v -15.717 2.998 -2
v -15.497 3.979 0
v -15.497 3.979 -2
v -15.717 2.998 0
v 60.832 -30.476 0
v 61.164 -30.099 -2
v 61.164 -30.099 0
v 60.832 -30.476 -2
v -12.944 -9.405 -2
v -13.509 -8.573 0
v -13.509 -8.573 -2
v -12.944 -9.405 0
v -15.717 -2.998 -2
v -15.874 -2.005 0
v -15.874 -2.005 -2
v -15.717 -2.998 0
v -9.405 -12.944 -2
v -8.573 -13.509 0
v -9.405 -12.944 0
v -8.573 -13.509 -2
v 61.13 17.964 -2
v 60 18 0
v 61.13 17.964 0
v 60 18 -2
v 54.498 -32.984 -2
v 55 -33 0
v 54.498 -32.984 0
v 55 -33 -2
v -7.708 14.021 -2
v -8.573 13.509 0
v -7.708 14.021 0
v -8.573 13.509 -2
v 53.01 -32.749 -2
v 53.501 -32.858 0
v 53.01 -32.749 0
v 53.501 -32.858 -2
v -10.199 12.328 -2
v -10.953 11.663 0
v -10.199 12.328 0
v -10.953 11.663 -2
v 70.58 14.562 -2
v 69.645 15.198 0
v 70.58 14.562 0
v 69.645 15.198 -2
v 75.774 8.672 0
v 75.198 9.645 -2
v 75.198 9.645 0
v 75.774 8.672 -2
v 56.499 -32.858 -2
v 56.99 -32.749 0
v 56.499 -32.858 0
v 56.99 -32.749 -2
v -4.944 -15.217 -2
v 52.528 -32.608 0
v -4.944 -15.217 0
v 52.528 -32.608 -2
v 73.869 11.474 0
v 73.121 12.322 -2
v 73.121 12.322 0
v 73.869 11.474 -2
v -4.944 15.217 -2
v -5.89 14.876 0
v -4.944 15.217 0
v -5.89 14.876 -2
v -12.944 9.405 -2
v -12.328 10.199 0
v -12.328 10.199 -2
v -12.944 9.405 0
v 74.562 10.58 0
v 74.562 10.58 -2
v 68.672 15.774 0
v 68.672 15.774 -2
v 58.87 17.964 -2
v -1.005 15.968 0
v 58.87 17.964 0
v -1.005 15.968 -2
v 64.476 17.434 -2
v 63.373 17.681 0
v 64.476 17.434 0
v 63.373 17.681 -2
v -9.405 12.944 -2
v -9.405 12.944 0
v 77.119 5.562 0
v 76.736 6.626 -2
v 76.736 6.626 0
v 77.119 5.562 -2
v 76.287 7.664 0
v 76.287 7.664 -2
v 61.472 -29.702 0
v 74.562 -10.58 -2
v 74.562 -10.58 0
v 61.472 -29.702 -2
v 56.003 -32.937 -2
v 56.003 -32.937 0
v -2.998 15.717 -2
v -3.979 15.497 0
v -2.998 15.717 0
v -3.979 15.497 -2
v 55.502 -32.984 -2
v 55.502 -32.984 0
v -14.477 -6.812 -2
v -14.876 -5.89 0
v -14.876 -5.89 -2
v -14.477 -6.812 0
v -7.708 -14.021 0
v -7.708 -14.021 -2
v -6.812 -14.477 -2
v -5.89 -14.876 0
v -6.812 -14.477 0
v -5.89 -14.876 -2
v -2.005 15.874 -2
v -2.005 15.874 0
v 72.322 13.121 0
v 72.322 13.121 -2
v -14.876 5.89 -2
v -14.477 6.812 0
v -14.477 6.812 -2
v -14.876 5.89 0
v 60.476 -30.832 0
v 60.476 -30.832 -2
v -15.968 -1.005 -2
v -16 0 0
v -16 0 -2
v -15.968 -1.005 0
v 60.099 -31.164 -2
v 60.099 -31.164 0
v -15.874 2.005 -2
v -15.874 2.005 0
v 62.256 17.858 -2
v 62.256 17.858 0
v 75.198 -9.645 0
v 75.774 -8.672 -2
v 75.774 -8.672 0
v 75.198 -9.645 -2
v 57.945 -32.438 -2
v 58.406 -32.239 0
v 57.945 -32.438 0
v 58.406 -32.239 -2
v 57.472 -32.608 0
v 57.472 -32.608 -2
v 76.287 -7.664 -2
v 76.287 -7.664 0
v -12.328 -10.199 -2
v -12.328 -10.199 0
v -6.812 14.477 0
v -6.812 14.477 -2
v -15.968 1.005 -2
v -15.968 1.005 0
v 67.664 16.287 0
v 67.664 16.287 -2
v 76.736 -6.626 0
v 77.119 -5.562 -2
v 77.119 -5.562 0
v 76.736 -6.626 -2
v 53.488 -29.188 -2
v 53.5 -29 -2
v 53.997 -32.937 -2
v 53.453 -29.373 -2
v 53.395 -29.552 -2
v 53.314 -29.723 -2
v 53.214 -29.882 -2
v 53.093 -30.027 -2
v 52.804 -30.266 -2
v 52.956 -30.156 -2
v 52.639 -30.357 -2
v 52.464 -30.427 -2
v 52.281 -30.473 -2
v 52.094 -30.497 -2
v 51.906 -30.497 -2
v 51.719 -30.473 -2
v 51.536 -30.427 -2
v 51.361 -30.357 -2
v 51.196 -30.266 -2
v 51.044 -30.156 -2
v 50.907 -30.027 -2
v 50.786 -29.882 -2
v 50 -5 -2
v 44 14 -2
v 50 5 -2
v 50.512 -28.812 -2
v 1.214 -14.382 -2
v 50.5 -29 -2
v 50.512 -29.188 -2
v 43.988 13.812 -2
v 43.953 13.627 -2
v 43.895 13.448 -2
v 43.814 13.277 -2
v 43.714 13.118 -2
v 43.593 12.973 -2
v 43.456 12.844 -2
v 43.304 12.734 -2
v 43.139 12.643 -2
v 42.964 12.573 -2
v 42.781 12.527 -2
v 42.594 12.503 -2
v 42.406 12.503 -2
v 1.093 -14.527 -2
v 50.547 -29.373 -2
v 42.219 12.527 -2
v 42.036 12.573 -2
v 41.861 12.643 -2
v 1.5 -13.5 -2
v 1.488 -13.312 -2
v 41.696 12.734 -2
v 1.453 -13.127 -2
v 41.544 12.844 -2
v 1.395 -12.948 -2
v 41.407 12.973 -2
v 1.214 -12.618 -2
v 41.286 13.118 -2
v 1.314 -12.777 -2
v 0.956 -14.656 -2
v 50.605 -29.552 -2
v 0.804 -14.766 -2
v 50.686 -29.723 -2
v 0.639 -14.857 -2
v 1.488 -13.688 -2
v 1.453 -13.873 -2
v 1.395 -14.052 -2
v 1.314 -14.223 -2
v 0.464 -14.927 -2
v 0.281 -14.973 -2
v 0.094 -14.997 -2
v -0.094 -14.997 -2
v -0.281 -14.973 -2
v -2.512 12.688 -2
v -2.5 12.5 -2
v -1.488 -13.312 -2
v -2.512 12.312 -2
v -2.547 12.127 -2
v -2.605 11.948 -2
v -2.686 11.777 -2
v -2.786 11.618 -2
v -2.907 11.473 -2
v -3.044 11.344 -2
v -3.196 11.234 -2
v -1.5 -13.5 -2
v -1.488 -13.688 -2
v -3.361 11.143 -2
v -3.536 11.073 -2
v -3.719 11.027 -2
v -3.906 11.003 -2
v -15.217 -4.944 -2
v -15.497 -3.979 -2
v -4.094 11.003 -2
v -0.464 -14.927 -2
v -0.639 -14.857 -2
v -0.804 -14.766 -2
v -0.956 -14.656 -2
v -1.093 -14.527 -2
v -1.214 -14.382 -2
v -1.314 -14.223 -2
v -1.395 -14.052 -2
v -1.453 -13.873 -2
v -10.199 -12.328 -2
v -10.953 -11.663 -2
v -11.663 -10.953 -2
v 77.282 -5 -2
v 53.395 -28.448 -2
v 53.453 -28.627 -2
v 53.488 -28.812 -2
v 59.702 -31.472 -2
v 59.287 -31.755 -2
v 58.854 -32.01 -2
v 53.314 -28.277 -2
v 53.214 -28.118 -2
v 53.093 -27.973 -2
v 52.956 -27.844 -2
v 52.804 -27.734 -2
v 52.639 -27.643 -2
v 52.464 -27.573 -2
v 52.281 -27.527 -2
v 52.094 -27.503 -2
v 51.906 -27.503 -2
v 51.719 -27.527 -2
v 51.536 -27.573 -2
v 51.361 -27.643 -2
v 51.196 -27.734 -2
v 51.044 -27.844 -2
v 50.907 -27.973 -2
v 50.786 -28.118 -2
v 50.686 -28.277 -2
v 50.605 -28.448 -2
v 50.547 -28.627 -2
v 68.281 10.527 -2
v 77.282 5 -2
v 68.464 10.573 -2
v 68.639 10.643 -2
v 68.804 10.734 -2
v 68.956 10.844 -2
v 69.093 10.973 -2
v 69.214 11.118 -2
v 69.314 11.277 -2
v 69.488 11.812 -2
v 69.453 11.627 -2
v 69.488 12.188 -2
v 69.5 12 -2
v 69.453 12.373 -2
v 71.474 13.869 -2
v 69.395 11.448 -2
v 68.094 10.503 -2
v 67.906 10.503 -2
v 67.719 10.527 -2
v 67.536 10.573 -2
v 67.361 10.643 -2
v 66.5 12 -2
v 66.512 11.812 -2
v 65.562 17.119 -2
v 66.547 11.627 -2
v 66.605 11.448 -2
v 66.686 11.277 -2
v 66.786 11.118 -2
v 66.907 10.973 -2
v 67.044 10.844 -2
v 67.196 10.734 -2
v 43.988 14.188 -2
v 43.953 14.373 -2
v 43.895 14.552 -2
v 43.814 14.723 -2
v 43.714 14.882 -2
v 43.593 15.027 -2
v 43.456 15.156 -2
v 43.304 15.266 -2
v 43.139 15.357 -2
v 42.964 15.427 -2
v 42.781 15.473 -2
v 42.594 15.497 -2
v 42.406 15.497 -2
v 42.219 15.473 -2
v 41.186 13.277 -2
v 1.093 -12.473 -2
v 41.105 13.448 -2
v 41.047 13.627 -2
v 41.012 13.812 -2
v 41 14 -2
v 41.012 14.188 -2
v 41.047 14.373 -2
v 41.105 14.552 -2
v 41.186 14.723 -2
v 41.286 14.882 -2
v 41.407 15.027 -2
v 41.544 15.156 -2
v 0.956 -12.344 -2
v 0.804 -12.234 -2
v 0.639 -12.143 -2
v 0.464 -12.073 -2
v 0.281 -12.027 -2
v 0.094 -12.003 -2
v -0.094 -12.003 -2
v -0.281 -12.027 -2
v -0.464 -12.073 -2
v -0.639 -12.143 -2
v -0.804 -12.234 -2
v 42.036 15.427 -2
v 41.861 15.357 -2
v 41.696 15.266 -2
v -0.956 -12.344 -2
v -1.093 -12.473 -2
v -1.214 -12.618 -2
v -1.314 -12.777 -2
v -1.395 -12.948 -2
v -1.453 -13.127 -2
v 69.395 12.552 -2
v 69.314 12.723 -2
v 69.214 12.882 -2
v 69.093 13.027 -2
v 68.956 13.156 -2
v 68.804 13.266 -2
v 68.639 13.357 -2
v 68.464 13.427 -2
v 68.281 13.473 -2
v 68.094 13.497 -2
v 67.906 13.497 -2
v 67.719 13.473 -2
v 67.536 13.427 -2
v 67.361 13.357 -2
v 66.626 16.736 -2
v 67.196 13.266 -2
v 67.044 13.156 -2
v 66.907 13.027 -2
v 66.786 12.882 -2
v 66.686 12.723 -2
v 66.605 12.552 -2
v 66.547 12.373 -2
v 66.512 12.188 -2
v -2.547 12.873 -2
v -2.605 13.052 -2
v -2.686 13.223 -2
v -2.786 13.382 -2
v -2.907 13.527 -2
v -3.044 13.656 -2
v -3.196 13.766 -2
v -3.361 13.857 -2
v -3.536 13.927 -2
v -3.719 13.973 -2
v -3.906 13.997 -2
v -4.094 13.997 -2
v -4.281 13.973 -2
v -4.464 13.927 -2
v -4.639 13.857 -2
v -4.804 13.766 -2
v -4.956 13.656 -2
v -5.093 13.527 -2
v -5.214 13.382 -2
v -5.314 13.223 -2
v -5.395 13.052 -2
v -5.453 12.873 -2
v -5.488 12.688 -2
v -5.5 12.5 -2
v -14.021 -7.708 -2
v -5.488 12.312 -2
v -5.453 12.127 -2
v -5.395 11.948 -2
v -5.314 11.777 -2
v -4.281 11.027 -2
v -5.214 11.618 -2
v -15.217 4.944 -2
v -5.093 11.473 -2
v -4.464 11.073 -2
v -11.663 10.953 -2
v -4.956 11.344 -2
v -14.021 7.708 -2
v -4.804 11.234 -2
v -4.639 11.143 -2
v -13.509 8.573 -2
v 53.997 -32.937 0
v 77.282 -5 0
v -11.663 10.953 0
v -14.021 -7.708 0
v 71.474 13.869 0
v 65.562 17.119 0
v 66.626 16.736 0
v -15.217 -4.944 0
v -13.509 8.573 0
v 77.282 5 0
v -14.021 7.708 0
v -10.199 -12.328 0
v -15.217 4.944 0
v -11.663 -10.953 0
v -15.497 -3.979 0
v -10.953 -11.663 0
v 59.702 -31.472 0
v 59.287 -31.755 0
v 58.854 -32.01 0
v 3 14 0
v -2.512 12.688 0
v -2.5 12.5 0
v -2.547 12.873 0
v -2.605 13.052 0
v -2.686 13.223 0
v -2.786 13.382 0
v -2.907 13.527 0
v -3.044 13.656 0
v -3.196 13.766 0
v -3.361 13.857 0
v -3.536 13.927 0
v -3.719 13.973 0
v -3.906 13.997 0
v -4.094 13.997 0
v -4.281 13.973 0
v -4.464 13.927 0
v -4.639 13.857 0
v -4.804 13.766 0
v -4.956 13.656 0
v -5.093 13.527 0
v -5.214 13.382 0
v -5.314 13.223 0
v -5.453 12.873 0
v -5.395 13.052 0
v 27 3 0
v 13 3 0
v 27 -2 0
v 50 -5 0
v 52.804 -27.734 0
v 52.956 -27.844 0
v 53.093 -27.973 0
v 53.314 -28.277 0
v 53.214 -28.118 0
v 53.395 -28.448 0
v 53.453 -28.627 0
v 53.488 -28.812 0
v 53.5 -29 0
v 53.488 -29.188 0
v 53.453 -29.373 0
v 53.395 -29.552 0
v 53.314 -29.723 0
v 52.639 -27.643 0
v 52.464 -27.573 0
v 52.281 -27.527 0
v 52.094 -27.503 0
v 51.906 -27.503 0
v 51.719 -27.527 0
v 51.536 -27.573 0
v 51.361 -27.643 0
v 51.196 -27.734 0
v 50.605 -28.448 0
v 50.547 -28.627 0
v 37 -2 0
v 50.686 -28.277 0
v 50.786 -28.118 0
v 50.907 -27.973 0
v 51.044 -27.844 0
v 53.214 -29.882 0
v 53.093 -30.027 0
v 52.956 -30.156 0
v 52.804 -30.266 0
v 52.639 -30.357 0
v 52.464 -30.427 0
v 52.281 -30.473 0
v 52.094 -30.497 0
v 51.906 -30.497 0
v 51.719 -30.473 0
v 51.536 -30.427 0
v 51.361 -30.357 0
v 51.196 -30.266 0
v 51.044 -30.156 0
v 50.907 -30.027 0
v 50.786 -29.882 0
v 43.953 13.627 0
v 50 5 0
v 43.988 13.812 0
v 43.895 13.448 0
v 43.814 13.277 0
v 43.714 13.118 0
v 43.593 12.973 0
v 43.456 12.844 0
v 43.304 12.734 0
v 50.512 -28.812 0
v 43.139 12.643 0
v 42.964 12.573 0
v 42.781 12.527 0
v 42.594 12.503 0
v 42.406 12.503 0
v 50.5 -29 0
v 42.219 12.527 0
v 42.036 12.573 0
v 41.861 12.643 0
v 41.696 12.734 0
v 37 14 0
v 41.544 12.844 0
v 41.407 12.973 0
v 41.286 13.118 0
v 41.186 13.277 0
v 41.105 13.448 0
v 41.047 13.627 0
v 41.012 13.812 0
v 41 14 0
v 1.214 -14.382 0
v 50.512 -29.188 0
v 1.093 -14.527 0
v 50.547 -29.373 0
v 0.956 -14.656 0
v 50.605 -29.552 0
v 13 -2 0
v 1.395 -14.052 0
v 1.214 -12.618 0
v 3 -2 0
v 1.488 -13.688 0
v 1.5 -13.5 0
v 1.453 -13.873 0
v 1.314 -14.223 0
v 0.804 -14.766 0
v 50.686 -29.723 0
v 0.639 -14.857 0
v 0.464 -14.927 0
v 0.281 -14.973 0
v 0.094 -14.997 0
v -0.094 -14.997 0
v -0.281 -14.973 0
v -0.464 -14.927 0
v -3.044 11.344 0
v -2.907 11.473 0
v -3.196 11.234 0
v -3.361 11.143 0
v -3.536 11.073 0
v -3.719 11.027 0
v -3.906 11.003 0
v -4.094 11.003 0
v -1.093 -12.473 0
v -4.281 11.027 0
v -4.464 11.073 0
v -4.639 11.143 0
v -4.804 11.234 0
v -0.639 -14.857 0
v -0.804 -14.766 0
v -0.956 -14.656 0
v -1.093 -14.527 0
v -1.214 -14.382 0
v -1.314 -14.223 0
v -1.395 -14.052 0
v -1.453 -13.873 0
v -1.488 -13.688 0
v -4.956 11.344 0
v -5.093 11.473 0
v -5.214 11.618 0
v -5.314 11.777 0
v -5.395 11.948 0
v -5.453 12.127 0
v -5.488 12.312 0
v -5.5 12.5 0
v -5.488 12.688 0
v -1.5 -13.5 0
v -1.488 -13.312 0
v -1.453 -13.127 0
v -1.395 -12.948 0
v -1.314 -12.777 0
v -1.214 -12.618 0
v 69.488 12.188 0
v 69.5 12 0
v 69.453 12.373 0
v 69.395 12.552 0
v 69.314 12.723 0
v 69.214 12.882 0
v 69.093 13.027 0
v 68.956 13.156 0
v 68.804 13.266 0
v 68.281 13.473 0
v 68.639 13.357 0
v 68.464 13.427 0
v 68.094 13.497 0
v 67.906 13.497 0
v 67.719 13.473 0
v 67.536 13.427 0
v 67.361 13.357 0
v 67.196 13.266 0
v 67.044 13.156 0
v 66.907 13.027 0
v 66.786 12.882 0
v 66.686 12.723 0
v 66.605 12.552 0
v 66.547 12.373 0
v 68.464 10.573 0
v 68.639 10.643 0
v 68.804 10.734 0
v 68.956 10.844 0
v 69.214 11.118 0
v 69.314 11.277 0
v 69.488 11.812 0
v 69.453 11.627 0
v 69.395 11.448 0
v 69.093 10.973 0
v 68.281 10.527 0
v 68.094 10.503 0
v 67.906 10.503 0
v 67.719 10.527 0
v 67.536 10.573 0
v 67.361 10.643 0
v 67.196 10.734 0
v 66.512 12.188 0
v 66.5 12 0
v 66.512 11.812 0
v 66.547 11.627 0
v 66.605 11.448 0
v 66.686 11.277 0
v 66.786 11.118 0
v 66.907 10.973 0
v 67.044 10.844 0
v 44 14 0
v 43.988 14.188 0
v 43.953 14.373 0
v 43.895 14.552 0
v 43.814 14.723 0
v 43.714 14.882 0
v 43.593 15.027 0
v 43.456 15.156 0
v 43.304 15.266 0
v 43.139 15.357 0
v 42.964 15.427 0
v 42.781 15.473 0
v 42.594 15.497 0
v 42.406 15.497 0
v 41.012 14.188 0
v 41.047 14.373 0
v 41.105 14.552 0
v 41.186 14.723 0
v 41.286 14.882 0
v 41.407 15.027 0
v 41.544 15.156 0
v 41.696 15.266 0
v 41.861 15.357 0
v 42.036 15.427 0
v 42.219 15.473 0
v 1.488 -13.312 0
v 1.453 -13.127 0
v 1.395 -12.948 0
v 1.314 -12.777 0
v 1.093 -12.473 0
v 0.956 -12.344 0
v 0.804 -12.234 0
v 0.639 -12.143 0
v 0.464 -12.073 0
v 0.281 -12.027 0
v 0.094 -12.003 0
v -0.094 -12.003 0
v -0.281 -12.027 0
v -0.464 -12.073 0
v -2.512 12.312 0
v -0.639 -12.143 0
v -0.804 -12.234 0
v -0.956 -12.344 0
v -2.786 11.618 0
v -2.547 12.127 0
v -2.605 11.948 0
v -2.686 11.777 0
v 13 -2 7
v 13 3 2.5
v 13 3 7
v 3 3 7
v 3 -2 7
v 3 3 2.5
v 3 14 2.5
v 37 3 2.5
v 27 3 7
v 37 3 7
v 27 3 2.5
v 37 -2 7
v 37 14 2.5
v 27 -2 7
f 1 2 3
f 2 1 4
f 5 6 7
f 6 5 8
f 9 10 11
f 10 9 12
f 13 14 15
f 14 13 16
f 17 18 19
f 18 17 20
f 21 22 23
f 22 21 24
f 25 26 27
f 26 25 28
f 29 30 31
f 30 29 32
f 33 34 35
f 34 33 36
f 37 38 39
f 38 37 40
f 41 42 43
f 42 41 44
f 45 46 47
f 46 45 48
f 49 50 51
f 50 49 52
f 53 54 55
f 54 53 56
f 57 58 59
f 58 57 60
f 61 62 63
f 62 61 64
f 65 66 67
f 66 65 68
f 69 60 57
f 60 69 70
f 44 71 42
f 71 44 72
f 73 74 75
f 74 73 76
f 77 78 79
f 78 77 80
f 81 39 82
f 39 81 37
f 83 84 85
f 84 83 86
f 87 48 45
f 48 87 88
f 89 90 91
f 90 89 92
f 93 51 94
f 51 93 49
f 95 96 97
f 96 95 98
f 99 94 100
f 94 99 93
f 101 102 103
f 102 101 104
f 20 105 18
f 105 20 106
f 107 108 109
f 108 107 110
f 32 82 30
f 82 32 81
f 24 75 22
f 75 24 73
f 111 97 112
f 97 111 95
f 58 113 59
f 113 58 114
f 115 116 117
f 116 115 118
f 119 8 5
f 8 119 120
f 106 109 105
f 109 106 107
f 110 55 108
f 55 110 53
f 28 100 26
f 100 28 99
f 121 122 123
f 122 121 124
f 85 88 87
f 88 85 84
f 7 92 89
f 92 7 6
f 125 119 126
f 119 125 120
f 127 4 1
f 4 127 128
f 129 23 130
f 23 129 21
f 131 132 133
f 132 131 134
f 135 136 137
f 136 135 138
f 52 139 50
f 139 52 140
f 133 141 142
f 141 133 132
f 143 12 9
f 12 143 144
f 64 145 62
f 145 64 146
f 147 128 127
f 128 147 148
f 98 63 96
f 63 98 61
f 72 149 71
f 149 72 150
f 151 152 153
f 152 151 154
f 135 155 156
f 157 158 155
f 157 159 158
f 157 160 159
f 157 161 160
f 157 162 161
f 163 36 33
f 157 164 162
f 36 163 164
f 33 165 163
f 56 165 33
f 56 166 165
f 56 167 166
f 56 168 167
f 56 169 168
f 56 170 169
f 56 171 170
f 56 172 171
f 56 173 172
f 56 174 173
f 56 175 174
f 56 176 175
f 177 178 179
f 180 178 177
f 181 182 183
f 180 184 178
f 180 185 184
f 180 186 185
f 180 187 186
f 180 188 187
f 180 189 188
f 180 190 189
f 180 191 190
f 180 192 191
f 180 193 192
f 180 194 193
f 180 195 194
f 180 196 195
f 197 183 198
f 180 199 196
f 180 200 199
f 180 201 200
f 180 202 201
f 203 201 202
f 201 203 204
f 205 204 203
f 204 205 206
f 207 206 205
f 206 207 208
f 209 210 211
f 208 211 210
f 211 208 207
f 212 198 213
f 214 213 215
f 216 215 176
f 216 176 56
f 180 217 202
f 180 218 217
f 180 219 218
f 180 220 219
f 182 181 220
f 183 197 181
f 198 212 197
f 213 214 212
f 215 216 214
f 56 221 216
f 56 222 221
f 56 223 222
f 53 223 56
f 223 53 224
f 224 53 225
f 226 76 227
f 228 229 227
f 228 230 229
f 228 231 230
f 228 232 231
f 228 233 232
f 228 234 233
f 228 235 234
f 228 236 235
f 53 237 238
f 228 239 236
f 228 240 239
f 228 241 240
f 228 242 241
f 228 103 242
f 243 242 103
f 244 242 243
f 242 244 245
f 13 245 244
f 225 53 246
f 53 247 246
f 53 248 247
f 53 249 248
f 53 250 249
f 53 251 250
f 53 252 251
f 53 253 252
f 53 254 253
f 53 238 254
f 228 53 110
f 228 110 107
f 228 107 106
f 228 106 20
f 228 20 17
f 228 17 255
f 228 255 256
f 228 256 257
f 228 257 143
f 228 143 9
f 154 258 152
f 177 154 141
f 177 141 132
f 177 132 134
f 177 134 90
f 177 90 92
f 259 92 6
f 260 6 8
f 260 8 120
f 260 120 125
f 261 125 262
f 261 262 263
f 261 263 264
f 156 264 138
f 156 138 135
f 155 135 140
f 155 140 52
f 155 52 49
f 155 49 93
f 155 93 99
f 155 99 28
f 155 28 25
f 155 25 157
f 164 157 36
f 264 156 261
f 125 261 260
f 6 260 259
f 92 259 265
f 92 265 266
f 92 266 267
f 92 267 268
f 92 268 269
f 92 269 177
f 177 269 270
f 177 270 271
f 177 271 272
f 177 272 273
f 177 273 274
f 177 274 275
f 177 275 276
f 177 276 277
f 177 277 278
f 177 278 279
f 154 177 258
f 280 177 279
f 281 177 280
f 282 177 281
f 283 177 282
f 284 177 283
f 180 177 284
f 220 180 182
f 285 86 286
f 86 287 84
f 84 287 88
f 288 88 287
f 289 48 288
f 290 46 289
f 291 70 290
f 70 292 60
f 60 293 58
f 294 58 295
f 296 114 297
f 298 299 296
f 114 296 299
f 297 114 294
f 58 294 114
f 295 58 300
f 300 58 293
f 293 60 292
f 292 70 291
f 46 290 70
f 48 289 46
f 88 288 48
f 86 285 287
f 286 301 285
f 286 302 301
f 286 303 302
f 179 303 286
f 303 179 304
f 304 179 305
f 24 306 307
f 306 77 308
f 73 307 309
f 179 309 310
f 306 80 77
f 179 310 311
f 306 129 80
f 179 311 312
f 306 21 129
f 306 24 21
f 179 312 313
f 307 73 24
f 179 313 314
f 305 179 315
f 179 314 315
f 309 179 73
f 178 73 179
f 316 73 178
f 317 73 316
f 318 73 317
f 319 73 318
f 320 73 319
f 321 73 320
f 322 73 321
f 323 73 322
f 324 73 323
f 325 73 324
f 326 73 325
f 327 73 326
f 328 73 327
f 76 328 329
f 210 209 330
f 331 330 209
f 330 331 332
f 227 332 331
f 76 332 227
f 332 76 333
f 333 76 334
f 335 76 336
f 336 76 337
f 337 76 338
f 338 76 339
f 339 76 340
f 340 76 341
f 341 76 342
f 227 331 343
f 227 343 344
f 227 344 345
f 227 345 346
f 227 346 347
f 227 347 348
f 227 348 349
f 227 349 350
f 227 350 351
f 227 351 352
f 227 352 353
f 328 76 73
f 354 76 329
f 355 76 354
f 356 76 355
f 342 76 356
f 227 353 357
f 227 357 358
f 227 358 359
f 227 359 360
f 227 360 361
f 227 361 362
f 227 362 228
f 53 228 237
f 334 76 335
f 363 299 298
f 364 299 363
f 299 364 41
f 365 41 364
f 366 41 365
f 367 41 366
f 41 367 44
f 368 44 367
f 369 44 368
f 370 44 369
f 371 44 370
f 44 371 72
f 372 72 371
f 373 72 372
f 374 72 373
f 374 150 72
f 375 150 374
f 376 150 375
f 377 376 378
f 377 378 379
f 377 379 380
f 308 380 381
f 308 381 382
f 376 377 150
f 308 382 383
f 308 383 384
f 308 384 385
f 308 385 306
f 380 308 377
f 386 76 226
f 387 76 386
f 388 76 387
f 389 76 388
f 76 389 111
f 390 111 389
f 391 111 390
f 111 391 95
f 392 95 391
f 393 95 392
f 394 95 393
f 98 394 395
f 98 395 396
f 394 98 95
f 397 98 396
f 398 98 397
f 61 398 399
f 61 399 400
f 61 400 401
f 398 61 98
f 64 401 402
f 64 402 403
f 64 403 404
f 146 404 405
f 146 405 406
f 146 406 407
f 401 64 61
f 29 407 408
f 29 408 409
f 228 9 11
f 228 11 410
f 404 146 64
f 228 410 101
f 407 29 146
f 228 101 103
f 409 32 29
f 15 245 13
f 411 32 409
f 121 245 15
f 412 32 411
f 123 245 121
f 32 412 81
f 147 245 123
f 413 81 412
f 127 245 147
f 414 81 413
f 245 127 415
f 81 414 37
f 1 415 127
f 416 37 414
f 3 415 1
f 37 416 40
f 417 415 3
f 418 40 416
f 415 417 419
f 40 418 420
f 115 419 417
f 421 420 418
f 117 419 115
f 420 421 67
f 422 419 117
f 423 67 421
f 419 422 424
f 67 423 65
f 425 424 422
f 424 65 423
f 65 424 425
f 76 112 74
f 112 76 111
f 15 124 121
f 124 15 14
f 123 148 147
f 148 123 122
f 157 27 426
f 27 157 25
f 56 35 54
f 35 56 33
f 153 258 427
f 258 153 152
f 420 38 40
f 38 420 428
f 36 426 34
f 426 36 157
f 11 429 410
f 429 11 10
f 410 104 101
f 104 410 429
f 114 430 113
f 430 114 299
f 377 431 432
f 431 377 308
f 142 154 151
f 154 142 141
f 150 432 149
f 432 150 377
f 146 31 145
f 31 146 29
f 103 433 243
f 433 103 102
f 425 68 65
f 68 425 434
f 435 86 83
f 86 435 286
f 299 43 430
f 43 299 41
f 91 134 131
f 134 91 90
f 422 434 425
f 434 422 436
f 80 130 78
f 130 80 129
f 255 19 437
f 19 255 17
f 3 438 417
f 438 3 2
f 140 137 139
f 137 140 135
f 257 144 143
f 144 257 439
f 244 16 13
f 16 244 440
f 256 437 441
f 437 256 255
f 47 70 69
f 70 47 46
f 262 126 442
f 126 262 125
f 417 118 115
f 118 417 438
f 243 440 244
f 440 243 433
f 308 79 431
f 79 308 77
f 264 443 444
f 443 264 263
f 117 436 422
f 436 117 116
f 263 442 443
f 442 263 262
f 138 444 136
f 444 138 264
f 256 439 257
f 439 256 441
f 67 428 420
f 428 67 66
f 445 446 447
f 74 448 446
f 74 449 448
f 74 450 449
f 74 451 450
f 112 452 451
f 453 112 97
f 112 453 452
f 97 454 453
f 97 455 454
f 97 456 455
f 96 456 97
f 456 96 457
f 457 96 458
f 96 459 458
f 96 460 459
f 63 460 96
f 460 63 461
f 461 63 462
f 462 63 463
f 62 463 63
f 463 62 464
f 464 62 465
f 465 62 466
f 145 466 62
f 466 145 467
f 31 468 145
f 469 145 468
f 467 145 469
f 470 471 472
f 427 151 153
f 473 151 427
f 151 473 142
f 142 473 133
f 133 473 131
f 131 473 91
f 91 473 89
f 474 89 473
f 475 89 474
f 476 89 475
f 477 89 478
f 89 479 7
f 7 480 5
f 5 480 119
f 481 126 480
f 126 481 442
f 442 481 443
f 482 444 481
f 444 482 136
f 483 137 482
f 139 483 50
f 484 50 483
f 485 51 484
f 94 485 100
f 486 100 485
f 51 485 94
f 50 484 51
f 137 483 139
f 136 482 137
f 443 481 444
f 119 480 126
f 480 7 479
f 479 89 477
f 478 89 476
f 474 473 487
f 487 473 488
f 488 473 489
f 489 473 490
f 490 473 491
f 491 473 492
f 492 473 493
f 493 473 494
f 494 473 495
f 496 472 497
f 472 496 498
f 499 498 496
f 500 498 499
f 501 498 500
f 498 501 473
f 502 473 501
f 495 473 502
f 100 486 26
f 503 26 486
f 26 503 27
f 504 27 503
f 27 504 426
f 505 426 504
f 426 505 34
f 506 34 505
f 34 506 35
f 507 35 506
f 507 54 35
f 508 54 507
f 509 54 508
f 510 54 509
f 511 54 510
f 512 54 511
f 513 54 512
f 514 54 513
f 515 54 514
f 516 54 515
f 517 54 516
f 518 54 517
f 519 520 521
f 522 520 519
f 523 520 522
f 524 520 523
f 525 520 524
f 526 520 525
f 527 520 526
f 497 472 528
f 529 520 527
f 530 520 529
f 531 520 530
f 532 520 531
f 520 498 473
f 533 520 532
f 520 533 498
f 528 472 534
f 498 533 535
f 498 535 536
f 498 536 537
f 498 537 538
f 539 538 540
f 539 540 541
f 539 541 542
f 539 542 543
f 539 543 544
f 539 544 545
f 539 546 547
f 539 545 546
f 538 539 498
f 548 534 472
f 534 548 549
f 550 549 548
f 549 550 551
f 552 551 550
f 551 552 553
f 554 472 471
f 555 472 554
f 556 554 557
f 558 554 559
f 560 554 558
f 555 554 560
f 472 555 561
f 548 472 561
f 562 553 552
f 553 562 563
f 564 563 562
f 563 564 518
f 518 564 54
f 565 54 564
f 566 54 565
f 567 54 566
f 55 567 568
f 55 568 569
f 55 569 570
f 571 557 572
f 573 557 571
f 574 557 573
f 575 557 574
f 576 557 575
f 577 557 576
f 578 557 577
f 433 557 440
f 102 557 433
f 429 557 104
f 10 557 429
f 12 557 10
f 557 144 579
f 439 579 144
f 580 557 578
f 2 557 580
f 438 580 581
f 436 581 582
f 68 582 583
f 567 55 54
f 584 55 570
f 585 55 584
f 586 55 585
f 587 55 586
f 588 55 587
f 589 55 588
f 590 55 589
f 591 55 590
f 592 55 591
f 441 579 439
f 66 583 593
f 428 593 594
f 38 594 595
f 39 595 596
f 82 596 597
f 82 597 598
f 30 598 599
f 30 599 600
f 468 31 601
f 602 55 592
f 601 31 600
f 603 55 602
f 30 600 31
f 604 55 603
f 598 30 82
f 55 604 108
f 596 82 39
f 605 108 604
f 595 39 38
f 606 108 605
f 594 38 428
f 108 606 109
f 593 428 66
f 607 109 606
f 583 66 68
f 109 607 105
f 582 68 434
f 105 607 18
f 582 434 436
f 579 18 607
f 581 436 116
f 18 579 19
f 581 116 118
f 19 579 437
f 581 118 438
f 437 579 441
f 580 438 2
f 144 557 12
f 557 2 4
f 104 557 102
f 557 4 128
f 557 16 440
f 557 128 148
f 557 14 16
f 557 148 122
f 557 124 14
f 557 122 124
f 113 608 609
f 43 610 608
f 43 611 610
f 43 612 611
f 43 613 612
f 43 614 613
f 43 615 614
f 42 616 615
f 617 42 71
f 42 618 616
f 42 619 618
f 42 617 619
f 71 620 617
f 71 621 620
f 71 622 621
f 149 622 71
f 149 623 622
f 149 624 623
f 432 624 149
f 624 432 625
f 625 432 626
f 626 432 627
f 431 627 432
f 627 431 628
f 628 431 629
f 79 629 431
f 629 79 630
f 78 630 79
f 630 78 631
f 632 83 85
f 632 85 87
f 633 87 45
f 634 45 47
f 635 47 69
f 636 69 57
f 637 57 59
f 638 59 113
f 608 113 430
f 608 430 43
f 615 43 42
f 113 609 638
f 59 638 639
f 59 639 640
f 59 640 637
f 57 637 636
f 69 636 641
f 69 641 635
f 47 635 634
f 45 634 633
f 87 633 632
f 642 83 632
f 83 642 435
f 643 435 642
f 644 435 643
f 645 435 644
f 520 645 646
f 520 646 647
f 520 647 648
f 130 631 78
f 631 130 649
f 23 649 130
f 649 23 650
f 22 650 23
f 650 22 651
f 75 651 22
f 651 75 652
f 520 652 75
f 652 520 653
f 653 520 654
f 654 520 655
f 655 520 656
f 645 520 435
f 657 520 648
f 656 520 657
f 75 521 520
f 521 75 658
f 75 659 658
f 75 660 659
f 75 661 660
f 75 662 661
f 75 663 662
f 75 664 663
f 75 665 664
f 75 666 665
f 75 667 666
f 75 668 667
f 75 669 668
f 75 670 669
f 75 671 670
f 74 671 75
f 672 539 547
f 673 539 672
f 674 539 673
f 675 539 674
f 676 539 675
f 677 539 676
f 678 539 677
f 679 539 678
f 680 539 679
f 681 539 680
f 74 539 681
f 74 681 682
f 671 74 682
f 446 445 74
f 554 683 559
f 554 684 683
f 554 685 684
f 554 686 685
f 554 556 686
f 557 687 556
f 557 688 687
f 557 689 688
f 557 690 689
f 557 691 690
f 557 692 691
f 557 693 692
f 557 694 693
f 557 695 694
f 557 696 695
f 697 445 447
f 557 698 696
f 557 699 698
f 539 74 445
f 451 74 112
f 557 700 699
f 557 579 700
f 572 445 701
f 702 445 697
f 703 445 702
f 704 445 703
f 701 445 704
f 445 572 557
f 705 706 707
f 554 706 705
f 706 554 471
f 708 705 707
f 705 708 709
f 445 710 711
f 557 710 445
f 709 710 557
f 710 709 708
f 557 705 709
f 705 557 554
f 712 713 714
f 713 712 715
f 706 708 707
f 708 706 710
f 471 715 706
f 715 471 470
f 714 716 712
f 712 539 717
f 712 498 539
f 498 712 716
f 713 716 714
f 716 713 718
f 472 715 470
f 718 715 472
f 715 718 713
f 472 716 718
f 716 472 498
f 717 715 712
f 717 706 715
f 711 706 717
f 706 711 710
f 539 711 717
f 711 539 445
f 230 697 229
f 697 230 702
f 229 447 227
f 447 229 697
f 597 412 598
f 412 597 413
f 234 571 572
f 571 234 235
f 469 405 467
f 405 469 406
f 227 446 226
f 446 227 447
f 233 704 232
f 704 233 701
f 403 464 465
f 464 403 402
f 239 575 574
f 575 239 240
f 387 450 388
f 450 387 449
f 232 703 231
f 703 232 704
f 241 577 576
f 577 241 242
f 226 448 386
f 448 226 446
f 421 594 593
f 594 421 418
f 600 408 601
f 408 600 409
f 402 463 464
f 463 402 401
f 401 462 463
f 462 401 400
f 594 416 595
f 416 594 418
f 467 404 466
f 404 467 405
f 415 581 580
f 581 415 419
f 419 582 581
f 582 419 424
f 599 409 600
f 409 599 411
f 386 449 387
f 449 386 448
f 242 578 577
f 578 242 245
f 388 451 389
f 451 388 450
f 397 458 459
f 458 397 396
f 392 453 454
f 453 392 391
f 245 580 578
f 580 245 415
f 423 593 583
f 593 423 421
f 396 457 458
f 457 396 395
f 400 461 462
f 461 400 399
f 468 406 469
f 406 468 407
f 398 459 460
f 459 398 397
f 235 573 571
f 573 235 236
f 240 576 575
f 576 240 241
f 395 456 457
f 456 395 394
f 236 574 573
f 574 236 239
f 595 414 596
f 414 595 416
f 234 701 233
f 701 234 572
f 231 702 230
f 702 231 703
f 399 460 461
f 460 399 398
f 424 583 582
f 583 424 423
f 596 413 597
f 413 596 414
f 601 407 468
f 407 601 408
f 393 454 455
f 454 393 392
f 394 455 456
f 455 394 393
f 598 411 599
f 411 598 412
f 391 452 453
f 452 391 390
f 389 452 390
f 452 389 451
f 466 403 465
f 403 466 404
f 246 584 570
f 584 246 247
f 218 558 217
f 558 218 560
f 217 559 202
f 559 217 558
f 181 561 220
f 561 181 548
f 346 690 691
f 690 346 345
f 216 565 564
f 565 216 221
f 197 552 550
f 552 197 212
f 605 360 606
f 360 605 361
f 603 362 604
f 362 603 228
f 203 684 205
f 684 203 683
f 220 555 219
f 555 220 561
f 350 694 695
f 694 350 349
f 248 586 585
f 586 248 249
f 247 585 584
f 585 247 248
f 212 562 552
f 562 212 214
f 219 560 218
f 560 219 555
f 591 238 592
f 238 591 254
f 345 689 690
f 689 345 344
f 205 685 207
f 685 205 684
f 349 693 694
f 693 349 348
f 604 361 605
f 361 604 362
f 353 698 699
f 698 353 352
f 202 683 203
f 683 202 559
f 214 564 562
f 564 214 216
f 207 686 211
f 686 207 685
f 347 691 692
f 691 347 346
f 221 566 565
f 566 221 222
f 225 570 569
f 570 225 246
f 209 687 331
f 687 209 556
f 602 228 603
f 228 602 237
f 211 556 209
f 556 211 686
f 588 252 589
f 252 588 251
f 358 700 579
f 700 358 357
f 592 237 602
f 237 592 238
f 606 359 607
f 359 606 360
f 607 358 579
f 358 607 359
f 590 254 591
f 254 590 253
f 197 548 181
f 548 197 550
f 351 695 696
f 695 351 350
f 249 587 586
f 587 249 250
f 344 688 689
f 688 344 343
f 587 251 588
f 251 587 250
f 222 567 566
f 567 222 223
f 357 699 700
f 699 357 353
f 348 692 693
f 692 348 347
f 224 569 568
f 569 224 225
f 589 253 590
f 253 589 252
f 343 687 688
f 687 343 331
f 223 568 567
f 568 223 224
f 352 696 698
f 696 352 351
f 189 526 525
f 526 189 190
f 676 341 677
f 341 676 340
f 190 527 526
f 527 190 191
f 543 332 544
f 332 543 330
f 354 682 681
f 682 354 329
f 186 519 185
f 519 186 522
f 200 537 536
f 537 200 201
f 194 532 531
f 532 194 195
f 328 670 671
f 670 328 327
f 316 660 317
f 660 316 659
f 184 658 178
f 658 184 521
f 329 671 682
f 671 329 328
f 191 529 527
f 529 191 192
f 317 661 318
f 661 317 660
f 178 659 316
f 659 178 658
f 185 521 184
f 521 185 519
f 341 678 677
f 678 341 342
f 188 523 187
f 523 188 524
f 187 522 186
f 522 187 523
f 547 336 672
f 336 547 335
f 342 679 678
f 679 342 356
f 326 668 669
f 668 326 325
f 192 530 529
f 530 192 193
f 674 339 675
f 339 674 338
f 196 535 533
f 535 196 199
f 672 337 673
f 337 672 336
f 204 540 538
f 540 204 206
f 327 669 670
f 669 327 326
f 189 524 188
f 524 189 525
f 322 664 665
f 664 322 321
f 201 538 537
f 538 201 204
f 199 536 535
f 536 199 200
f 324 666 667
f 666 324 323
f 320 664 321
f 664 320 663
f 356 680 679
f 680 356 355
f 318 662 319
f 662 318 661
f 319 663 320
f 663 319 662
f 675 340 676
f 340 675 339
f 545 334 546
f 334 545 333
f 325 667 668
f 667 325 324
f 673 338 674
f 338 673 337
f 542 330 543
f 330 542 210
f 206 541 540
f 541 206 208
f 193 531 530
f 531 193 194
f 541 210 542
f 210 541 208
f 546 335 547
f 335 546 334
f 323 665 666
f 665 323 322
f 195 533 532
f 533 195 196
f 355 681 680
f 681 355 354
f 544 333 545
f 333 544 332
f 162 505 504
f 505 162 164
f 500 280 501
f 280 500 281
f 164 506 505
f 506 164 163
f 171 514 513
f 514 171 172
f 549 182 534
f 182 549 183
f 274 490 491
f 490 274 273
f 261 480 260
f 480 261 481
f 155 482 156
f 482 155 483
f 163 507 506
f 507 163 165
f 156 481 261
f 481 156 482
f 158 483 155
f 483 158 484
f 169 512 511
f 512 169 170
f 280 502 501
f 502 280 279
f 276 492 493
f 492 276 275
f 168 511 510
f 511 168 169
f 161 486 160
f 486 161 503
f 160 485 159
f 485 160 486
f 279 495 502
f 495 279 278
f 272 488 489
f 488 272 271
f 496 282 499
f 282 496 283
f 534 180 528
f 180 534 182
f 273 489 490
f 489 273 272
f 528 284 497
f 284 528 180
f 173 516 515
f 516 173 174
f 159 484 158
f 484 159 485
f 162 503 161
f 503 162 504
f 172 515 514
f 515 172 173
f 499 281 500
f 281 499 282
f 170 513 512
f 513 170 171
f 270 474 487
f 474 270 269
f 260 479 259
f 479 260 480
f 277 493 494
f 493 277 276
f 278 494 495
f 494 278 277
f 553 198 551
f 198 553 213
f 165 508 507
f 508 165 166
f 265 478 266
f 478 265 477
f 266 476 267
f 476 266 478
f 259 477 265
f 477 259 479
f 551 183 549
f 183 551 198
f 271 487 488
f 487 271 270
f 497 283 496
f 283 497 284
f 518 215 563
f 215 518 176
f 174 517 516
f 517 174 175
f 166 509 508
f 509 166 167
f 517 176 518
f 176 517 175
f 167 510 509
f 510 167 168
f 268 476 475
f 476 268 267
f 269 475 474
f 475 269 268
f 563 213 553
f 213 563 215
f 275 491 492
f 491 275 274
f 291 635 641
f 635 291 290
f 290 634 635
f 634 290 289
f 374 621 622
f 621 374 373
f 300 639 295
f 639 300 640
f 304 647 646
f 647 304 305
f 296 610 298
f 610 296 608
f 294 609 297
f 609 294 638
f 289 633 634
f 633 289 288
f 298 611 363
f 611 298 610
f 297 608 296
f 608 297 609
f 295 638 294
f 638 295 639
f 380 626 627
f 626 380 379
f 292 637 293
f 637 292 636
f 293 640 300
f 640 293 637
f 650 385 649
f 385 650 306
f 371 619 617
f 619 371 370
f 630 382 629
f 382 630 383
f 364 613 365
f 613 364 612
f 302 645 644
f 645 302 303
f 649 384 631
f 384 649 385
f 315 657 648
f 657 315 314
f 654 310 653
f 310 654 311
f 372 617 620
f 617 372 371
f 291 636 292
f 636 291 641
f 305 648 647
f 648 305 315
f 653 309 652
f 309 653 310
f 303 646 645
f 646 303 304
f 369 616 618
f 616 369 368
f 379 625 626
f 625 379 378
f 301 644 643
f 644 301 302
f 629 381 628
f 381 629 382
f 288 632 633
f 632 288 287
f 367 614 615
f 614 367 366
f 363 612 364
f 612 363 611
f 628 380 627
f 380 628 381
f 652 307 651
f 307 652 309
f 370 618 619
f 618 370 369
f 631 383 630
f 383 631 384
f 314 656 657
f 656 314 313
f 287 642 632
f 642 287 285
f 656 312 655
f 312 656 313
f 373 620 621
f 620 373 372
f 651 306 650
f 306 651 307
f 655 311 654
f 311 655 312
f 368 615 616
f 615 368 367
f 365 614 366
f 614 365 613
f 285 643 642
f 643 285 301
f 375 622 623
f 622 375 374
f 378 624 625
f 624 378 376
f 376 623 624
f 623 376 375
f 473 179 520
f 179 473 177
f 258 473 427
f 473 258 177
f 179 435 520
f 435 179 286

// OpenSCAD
r_ext=16;
ep=2;
hauteur=103;
r_vis=1.4;

module boitier(){
	difference(){
		hull(){
			cylinder(h = hauteur, r = r_ext, $fn=100);
			translate([60,0,0]){cylinder(h = hauteur, r = r_ext+2, $fn=100);}
			translate([55,25,0]){cylinder(h = hauteur, r = 8, $fn=100);}
		}

		//évidement intérieur général
		hull(){
			translate([0,0,-2])cylinder(h = hauteur+5, r = r_ext-ep, $fn=100);
			translate([60,0,-2]){cylinder(h = hauteur+5, r = r_ext+2-ep, $fn=100);}
			translate([55,25,-2]){cylinder(h = hauteur+5, r = 6, $fn=100);}
		}
		//ouvertures pour écran
		translate([7,-r_ext-5,12.5]){cube([26,10,78]);}

		//trou pour encodeur
		translate([59,-r_ext-5,63]){rotate([-90,0,0])cylinder(h = 15, r = 6, $fn=50);}
		
		
	}

	//ajout pour vissage des flancs
	difference(){
		union(){
			translate([-4,-r_ext+3.5,0])cylinder(h = hauteur, r = 2.5, $fn=50);
			translate([0,r_ext-2.5,0])cylinder(h = hauteur, r = 2.5, $fn=50);
			translate([42.5,-r_ext+2,0])cylinder(h = hauteur, r = 2.5, $fn=50);
			translate([52,29,0])cylinder(h = hauteur, r = 2.5, $fn=50);
			translate([68,-r_ext+4,0])cylinder(h = hauteur, r = 2.5, $fn=50);
		}

		translate([-4,-r_ext+3.5,-2])cylinder(h = hauteur+10, r = r_vis, $fn=50);
		translate([0,r_ext-2.5,-2])cylinder(h = hauteur+10, r = r_vis, $fn=50);
		translate([42.5,-r_ext+2,-2])cylinder(h = hauteur+10, r = r_vis, $fn=50);
		translate([52,29,-2])cylinder(h = hauteur+10, r = r_vis, $fn=50);
		translate([68,-r_ext+4,-2])cylinder(h = hauteur+10, r = r_vis, $fn=50);
	}
	

}

module capot(){
	difference(){
        union(){
            hull(){
                cylinder(h = ep, r = r_ext, $fn=100);
                translate([60,0,0]){cylinder(h = ep, r = r_ext+2, $fn=100);}
                translate([55,25,0]){cylinder(h = ep, r = 8, $fn=100);}
            }
            //déport pour maintenir l'écran en place
            translate([-r_ext+19,-r_ext+13,-7]){cube([10,5,7]);}
            translate([-r_ext+43,-r_ext+13,-7]){cube([10,5,7]);}
            translate([-r_ext+19,-r_ext+ep,-2.5]){cube([34,11,2.5]);}
            
        }
        //trous de vissage
        translate([-4,-r_ext+3.5,-2])cylinder(h = hauteur+10, r = 1.5, $fn=50);
        translate([0,r_ext-2.5,-2])cylinder(h = hauteur+10, r = 1.5, $fn=50);
        translate([42.5,-r_ext+2,-2])cylinder(h = hauteur+10, r = 1.5, $fn=50);
        translate([52,29,-2])cylinder(h = hauteur+10, r = 1.5, $fn=50);
        translate([68,-r_ext+4,-2])cylinder(h = hauteur, r = 1.5, $fn=50);

        //trou pour carte SD
        translate([50,-5,-2]){cube([30,10,5]);}
	}
}

//boitier();
//rotate([180,0,0])mirror(1,0,0)capot();
rotate([180,0,0])capot();
//capot();
